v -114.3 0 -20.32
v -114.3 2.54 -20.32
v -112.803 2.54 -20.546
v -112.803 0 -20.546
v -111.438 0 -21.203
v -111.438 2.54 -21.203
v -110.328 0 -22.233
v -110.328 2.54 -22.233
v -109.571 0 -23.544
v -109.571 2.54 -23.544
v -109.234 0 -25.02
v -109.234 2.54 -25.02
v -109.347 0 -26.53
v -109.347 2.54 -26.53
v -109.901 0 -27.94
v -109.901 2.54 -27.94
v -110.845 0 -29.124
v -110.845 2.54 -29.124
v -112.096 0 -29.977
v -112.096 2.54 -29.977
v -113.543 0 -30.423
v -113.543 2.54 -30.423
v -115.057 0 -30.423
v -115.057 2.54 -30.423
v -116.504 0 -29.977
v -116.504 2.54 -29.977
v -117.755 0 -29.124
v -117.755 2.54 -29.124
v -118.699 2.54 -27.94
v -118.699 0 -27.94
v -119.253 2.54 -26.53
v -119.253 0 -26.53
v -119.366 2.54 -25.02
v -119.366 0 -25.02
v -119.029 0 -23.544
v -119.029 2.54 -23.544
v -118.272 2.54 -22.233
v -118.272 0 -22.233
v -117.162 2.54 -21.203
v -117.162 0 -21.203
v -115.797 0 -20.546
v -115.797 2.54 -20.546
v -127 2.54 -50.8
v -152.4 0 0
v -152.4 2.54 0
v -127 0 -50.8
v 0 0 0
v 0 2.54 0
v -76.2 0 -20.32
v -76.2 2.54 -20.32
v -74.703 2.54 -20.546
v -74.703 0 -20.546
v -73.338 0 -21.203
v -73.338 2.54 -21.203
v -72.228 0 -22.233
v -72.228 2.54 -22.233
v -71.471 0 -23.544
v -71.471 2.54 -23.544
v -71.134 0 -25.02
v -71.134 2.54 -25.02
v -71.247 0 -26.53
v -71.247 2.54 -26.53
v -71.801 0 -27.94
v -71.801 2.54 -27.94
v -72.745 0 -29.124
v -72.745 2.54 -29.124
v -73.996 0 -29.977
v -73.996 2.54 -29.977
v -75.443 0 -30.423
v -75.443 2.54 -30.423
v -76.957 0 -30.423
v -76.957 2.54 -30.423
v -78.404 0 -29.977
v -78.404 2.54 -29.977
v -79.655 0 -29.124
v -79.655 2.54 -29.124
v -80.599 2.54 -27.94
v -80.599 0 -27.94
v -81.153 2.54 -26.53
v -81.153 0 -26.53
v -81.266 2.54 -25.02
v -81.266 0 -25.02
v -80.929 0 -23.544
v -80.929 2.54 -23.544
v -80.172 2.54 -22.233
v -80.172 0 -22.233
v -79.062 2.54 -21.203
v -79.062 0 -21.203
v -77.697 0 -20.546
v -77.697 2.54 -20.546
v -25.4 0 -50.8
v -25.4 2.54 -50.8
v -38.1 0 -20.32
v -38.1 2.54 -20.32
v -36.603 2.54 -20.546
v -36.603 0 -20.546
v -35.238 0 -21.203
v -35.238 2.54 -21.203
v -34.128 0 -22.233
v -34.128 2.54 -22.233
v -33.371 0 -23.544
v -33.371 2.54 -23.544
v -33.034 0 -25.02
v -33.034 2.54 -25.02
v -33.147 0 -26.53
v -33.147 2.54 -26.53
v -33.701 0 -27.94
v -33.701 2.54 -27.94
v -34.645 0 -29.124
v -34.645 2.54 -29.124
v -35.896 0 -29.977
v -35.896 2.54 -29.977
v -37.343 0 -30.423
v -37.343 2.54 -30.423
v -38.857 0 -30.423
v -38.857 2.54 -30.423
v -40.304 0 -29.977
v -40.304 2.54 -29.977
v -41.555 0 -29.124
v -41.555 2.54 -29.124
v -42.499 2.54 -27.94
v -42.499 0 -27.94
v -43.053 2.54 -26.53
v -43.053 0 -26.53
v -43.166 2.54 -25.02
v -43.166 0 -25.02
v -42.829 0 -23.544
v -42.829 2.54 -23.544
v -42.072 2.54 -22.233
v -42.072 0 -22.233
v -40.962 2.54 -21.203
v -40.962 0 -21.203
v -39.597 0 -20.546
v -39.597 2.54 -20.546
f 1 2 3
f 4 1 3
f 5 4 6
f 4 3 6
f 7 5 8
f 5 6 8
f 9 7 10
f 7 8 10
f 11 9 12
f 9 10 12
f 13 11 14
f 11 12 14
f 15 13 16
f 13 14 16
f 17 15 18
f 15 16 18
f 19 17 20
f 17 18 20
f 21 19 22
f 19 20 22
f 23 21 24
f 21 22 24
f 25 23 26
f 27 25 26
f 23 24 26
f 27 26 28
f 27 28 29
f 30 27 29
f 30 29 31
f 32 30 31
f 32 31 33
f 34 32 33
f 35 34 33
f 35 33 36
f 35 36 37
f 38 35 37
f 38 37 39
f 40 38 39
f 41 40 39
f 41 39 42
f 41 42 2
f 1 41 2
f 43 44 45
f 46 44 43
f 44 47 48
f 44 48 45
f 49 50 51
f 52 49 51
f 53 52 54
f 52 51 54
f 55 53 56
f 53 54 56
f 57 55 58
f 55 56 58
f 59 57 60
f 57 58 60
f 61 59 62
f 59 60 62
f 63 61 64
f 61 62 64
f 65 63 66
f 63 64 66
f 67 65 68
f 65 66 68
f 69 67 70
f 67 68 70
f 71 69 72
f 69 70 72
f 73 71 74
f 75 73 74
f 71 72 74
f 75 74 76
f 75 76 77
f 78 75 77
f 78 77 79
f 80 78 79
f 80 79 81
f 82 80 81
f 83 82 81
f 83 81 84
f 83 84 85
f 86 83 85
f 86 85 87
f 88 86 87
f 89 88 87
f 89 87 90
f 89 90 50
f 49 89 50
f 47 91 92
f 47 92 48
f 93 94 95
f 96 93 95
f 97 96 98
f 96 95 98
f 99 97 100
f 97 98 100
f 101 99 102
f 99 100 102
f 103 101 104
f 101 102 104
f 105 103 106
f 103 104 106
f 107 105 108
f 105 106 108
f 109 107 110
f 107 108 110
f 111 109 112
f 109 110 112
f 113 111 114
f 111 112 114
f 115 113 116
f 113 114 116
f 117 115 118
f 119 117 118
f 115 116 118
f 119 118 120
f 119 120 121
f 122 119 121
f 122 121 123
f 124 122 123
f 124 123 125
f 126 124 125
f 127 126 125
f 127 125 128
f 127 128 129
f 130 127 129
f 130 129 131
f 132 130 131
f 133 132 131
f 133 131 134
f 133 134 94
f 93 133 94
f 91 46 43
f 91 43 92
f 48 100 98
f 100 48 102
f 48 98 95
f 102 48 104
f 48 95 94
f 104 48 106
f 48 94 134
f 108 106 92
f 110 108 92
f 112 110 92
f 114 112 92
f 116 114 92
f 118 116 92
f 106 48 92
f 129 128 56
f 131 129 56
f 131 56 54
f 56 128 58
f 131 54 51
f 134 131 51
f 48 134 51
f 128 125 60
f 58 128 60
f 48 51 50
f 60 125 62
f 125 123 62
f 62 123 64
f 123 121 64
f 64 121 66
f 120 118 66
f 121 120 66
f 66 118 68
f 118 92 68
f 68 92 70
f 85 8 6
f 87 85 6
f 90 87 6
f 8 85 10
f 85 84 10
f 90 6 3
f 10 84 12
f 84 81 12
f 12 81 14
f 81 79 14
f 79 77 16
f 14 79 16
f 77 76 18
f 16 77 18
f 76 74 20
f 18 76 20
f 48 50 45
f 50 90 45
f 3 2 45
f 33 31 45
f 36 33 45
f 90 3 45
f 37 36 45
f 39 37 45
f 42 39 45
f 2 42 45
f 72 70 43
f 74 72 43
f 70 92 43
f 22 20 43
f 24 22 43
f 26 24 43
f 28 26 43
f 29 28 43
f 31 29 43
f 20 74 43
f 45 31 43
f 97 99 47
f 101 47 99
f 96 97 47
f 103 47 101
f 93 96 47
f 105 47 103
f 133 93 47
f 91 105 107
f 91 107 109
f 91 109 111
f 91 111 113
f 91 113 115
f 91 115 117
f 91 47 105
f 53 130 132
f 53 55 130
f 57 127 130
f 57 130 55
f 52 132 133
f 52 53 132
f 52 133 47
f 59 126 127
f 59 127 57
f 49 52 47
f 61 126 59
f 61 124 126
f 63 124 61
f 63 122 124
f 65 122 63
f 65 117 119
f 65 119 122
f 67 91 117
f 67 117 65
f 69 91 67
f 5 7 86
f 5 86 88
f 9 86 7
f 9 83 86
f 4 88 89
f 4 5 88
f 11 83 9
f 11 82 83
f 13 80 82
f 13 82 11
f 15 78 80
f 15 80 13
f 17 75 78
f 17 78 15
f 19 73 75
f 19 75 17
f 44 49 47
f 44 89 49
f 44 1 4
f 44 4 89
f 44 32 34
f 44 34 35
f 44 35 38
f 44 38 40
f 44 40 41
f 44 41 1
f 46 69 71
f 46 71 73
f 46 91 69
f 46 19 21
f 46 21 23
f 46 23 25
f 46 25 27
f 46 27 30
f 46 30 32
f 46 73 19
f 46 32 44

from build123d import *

# Parameters (mm, degrees)
BOSS_EXTRUDE1_DEPTH = 2.54
SKETCH2_R           = 5.08
CUT_EXTRUDE1_DEPTH  = 161.663784345


with BuildPart() as part:
    # Sketch1 → Boss-Extrude1 (new body)
    with BuildSketch(Plane(origin=(0, 0, 0), x_dir=(1, 0, 0), z_dir=(0, 1, 0))):
        Polygon((0, 0), (-152.4, 0), (-127, 50.8), (-25.4, 50.8), align=None)
    extrude(amount=BOSS_EXTRUDE1_DEPTH)

    # Sketch2 → Cut-Extrude1 (cut, through all)
    with BuildSketch(Plane(origin=(0, 2.54, 0), x_dir=(1, 0, 0), z_dir=(0, 1, 0))):
        with Locations(Location((-76.2, 25.4, 0), (0, 0, 270))):
            Circle(SKETCH2_R)
        with Locations(Location((-114.3, 25.4, 0), (0, 0, 270))):
            Circle(SKETCH2_R)
        with Locations(Location((-38.1, 25.4, 0), (0, 0, 270))):
            Circle(SKETCH2_R)
    extrude(amount=-CUT_EXTRUDE1_DEPTH, mode=Mode.SUBTRACT)


solid = part.part
